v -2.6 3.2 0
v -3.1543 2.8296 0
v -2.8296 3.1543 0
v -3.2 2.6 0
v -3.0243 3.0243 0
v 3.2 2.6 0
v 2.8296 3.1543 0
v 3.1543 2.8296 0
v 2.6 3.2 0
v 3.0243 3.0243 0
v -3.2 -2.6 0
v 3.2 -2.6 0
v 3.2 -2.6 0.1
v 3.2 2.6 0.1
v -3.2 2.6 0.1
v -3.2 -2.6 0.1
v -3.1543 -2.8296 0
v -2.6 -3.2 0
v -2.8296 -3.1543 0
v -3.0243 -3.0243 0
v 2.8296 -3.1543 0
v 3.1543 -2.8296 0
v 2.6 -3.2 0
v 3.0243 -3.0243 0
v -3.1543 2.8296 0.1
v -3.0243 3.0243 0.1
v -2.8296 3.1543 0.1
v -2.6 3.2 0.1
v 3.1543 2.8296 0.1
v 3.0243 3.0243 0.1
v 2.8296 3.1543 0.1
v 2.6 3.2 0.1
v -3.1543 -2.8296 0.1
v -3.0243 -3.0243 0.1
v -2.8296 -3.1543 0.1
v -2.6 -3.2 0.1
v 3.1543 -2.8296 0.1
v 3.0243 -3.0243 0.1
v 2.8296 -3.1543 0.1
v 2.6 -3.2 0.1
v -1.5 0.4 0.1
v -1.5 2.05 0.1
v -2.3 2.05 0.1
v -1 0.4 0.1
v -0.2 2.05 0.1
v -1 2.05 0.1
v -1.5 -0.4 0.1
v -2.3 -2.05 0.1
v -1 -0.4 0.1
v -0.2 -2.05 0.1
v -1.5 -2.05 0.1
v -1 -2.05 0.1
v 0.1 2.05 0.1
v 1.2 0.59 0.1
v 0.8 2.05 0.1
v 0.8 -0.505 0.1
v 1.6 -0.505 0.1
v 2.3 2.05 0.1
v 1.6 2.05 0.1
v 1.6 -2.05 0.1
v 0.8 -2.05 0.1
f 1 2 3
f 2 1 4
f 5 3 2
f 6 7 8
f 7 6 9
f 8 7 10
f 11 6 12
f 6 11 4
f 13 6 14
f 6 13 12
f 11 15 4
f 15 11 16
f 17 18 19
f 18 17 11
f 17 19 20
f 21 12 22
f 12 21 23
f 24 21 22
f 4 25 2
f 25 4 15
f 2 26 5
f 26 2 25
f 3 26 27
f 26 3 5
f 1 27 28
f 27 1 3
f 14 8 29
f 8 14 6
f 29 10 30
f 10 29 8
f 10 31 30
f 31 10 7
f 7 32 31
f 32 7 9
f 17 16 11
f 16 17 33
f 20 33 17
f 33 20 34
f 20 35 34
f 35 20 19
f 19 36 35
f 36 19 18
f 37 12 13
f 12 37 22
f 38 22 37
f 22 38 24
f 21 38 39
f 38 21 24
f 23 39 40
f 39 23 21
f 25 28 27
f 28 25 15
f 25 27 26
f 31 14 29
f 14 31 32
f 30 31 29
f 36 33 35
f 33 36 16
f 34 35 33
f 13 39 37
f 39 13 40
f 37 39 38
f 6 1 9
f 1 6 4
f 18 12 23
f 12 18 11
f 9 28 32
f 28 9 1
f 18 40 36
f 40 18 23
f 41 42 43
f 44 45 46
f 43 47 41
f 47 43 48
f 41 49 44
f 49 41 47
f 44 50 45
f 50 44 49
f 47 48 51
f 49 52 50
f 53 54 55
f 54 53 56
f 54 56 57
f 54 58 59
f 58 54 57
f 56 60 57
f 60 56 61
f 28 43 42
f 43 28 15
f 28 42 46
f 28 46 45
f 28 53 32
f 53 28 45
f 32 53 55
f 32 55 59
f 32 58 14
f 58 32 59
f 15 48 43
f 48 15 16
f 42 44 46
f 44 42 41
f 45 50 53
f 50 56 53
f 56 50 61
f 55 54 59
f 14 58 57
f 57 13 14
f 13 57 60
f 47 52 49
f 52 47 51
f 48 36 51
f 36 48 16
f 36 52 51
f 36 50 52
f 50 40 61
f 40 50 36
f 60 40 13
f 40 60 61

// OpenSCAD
// file: ../p/4-4edge.scad
use <../lib.scad>
$fa=1; $fs=0.2;
function ldraw_lib__4_4edge(realsolid=false) = [
// 0 Circle 1.0
// 0 Name: 4-4edge.dat
// 0 Author: James Jessiman
// 0 !LDRAW_ORG Primitive UPDATE 2017-01
// 0 !LICENSE Licensed under CC BY 2.0 and CC BY 4.0 : see CAreadme.txt
// 
// 0 BFC CERTIFY CCW
  [0,"BFC","CERTIFY"],
  [0,"BFC","CCW"],
// 
// 0 !HISTORY 1998-12-15 [PTadmin] Official Update 1998-10
// 0 !HISTORY 2005-12-28 [PTadmin] Official Update 2005-01
// 0 !HISTORY 2007-06-24 [PTadmin] Header formatted for Contributor Agreement
// 0 !HISTORY 2008-07-01 [PTadmin] Official Update 2008-01
// 0 !HISTORY 2017-01-15 [Steffen] BFCed
// 0 !HISTORY 2017-12-30 [PTadmin] Official Update 2017-01
// 
// 
// 2 24 1 0 0 0.9239 0 0.3827
  [2,24,1,0,0,0.9239,0,0.3827],
// 2 24 0.9239 0 0.3827 0.7071 0 0.7071
  [2,24,0.9239,0,0.3827,0.7071,0,0.7071],
// 2 24 0.7071 0 0.7071 0.3827 0 0.9239
  [2,24,0.7071,0,0.7071,0.3827,0,0.9239],
// 2 24 0.3827 0 0.9239 0 0 1
  [2,24,0.3827,0,0.9239,0,0,1],
// 2 24 0 0 1 -0.3827 0 0.9239
  [2,24,0,0,1,-0.3827,0,0.9239],
// 2 24 -0.3827 0 0.9239 -0.7071 0 0.7071
  [2,24,-0.3827,0,0.9239,-0.7071,0,0.7071],
// 2 24 -0.7071 0 0.7071 -0.9239 0 0.3827
  [2,24,-0.7071,0,0.7071,-0.9239,0,0.3827],
// 2 24 -0.9239 0 0.3827 -1 0 -0
  [2,24,-0.9239,0,0.3827,-1,0,-0],
// 2 24 -1 0 -0 -0.9239 0 -0.3827
  [2,24,-1,0,-0,-0.9239,0,-0.3827],
// 2 24 -0.9239 0 -0.3827 -0.7071 0 -0.7071
  [2,24,-0.9239,0,-0.3827,-0.7071,0,-0.7071],
// 2 24 -0.7071 0 -0.7071 -0.3827 0 -0.9239
  [2,24,-0.7071,0,-0.7071,-0.3827,0,-0.9239],
// 2 24 -0.3827 0 -0.9239 0 0 -1
  [2,24,-0.3827,0,-0.9239,0,0,-1],
// 2 24 0 0 -1 0.3827 0 -0.9239
  [2,24,0,0,-1,0.3827,0,-0.9239],
// 2 24 0.3827 0 -0.9239 0.7071 0 -0.7071
  [2,24,0.3827,0,-0.9239,0.7071,0,-0.7071],
// 2 24 0.7071 0 -0.7071 0.9239 0 -0.3827
  [2,24,0.7071,0,-0.7071,0.9239,0,-0.3827],
// 2 24 0.9239 0 -0.3827 1 0 0
  [2,24,0.9239,0,-0.3827,1,0,0],
];
module ldraw_lib__4_4edge(step=0, col=false, unit=2/5, alt=false, line=0.2, solid=!$preview)
    makepoly(ldraw_lib__4_4edge(solid), step=step, col=col, unit=unit, alt=alt, line=line, solid=solid);
ldraw_lib__4_4edge(line=0.2);
// file: ../p/4-4disc.scad
use <../lib.scad>
$fa=1; $fs=0.2;
function ldraw_lib__4_4disc(realsolid=false) = [
// 0 Disc 1.0
// 0 Name: 4-4disc.dat
// 0 Author: James Jessiman
// 0 !LDRAW_ORG Primitive UPDATE 2002-02
// 0 !LICENSE Licensed under CC BY 2.0 and CC BY 4.0 : see CAreadme.txt
// 
// 0 BFC CERTIFY CCW
  [0,"BFC","CERTIFY"],
  [0,"BFC","CCW"],
// 
// 0 !HISTORY 1998-12-15 [PTadmin] Official Update 1998-10
// 0 !HISTORY 2002-03-23 [sbliss] Added BFC statement
// 0 !HISTORY 2002-04-25 [PTadmin] Official Update 2002-02
// 0 !HISTORY 2007-06-24 [PTadmin] Header formatted for Contributor Agreement
// 0 !HISTORY 2008-07-01 [PTadmin] Official Update 2008-01
// 
// 
// 3 16 0 0 0 1 0 0 0.9239 0 0.3827
  [3,16,0,0,0,1,0,0,0.9239,0,0.3827],
// 3 16 0 0 0 0.9239 0 0.3827 0.7071 0 0.7071
  [3,16,0,0,0,0.9239,0,0.3827,0.7071,0,0.7071],
// 3 16 0 0 0 0.7071 0 0.7071 0.3827 0 0.9239
  [3,16,0,0,0,0.7071,0,0.7071,0.3827,0,0.9239],
// 3 16 0 0 0 0.3827 0 0.9239 0 0 1
  [3,16,0,0,0,0.3827,0,0.9239,0,0,1],
// 3 16 0 0 0 0 0 1 -0.3827 0 0.9239
  [3,16,0,0,0,0,0,1,-0.3827,0,0.9239],
// 3 16 0 0 0 -0.3827 0 0.9239 -0.7071 0 0.7071
  [3,16,0,0,0,-0.3827,0,0.9239,-0.7071,0,0.7071],
// 3 16 0 0 0 -0.7071 0 0.7071 -0.9239 0 0.3827
  [3,16,0,0,0,-0.7071,0,0.7071,-0.9239,0,0.3827],
// 3 16 0 0 0 -0.9239 0 0.3827 -1 0 -0
  [3,16,0,0,0,-0.9239,0,0.3827,-1,0,-0],
// 3 16 0 0 0 -1 0 -0 -0.9239 0 -0.3827
  [3,16,0,0,0,-1,0,-0,-0.9239,0,-0.3827],
// 3 16 0 0 0 -0.9239 0 -0.3827 -0.7071 0 -0.7071
  [3,16,0,0,0,-0.9239,0,-0.3827,-0.7071,0,-0.7071],
// 3 16 0 0 0 -0.7071 0 -0.7071 -0.3827 0 -0.9239
  [3,16,0,0,0,-0.7071,0,-0.7071,-0.3827,0,-0.9239],
// 3 16 0 0 0 -0.3827 0 -0.9239 0 0 -1
  [3,16,0,0,0,-0.3827,0,-0.9239,0,0,-1],
// 3 16 0 0 0 0 0 -1 0.3827 0 -0.9239
  [3,16,0,0,0,0,0,-1,0.3827,0,-0.9239],
// 3 16 0 0 0 0.3827 0 -0.9239 0.7071 0 -0.7071
  [3,16,0,0,0,0.3827,0,-0.9239,0.7071,0,-0.7071],
// 3 16 0 0 0 0.7071 0 -0.7071 0.9239 0 -0.3827
  [3,16,0,0,0,0.7071,0,-0.7071,0.9239,0,-0.3827],
// 3 16 0 0 0 0.9239 0 -0.3827 1 0 0
  [3,16,0,0,0,0.9239,0,-0.3827,1,0,0],
// 0
];
module ldraw_lib__4_4disc(step=0, col=false, unit=2/5, alt=false, line=0.2, solid=!$preview)
    makepoly(ldraw_lib__4_4disc(solid), step=step, col=col, unit=unit, alt=alt, line=line, solid=solid);
ldraw_lib__4_4disc(line=0.2);
// file: ../p/4-4cyli.scad
use <../lib.scad>
$fa=1; $fs=0.2;
function ldraw_lib__4_4cyli(realsolid=false) = [
// 0 Cylinder 1.0
// 0 Name: 4-4cyli.dat
// 0 Author: James Jessiman
// 0 !LDRAW_ORG Primitive UPDATE 2005-01
// 0 !LICENSE Licensed under CC BY 2.0 and CC BY 4.0 : see CAreadme.txt
// 
// 0 BFC CERTIFY CCW
  [0,"BFC","CERTIFY"],
  [0,"BFC","CCW"],
// 
// 0 !HISTORY 1998-12-15 [PTadmin] Official Update 1998-10
// 0 !HISTORY 2002-03-23 [sbliss] Added BFC statement; merged headers from files in distributions LDraw 0.27 and Complete.
// 0 !HISTORY 2002-04-25 [PTadmin] Official Update 2002-02
// 0 !HISTORY 2004-12-14 [guyvivan] BFC CCW
// 0 !HISTORY 2005-12-28 [PTadmin] Official Update 2005-01
// 0 !HISTORY 2007-06-24 [PTadmin] Header formatted for Contributor Agreement
// 0 !HISTORY 2008-07-01 [PTadmin] Official Update 2008-01
// 
// 
// 4 16 1 1 0 0.9239 1 0.3827 0.9239 0 0.3827 1 0 0
  [4,16,1,1,0,0.9239,1,0.3827,0.9239,0,0.3827,1,0,0],
// 5 24 1 0 0 1 1 0 0.9239 0 0.3827 0.9239 0 -0.3827
  [5,24,1,0,0,1,1,0,0.9239,0,0.3827,0.9239,0,-0.3827],
// 4 16 0.9239 1 0.3827 0.7071 1 0.7071 0.7071 0 0.7071 0.9239 0 0.3827
  [4,16,0.9239,1,0.3827,0.7071,1,0.7071,0.7071,0,0.7071,0.9239,0,0.3827],
// 5 24 0.9239 0 0.3827 0.9239 1 0.3827 0.7071 0 0.7071 1 0 0
  [5,24,0.9239,0,0.3827,0.9239,1,0.3827,0.7071,0,0.7071,1,0,0],
// 4 16 0.7071 1 0.7071 0.3827 1 0.9239 0.3827 0 0.9239 0.7071 0 0.7071
  [4,16,0.7071,1,0.7071,0.3827,1,0.9239,0.3827,0,0.9239,0.7071,0,0.7071],
// 5 24 0.7071 0 0.7071 0.7071 1 0.7071 0.3827 0 0.9239 0.9239 0 0.3827
  [5,24,0.7071,0,0.7071,0.7071,1,0.7071,0.3827,0,0.9239,0.9239,0,0.3827],
// 4 16 0.3827 1 0.9239 0 1 1 0 0 1 0.3827 0 0.9239
  [4,16,0.3827,1,0.9239,0,1,1,0,0,1,0.3827,0,0.9239],
// 5 24 0.3827 0 0.9239 0.3827 1 0.9239 0 0 1 0.7071 0 0.7071
  [5,24,0.3827,0,0.9239,0.3827,1,0.9239,0,0,1,0.7071,0,0.7071],
// 4 16 0 1 1 -0.3827 1 0.9239 -0.3827 0 0.9239 0 0 1
  [4,16,0,1,1,-0.3827,1,0.9239,-0.3827,0,0.9239,0,0,1],
// 5 24 0 0 1 0 1 1 -0.3827 0 0.9239 0.3827 0 0.9239
  [5,24,0,0,1,0,1,1,-0.3827,0,0.9239,0.3827,0,0.9239],
// 4 16 -0.3827 1 0.9239 -0.7071 1 0.7071 -0.7071 0 0.7071 -0.3827 0 0.9239
  [4,16,-0.3827,1,0.9239,-0.7071,1,0.7071,-0.7071,0,0.7071,-0.3827,0,0.9239],
// 5 24 -0.3827 0 0.9239 -0.3827 1 0.9239 -0.7071 0 0.7071 0 0 1
  [5,24,-0.3827,0,0.9239,-0.3827,1,0.9239,-0.7071,0,0.7071,0,0,1],
// 4 16 -0.7071 1 0.7071 -0.9239 1 0.3827 -0.9239 0 0.3827 -0.7071 0 0.7071
  [4,16,-0.7071,1,0.7071,-0.9239,1,0.3827,-0.9239,0,0.3827,-0.7071,0,0.7071],
// 5 24 -0.7071 0 0.7071 -0.7071 1 0.7071 -0.9239 0 0.3827 -0.3827 0 0.9239
  [5,24,-0.7071,0,0.7071,-0.7071,1,0.7071,-0.9239,0,0.3827,-0.3827,0,0.9239],
// 4 16 -0.9239 1 0.3827 -1 1 0 -1 0 0 -0.9239 0 0.3827
  [4,16,-0.9239,1,0.3827,-1,1,0,-1,0,0,-0.9239,0,0.3827],
// 5 24 -0.9239 0 0.3827 -0.9239 1 0.3827 -1 0 0 -0.7071 0 0.7071
  [5,24,-0.9239,0,0.3827,-0.9239,1,0.3827,-1,0,0,-0.7071,0,0.7071],
// 4 16 -1 1 0 -0.9239 1 -0.3827 -0.9239 0 -0.3827 -1 0 0
  [4,16,-1,1,0,-0.9239,1,-0.3827,-0.9239,0,-0.3827,-1,0,0],
// 5 24 -1 0 0 -1 1 0 -0.9239 0 -0.3827 -0.9239 0 0.3827
  [5,24,-1,0,0,-1,1,0,-0.9239,0,-0.3827,-0.9239,0,0.3827],
// 4 16 -0.9239 1 -0.3827 -0.7071 1 -0.7071 -0.7071 0 -0.7071 -0.9239 0 -0.3827
  [4,16,-0.9239,1,-0.3827,-0.7071,1,-0.7071,-0.7071,0,-0.7071,-0.9239,0,-0.3827],
// 5 24 -0.9239 0 -0.3827 -0.9239 1 -0.3827 -0.7071 0 -0.7071 -1 0 0
  [5,24,-0.9239,0,-0.3827,-0.9239,1,-0.3827,-0.7071,0,-0.7071,-1,0,0],
// 4 16 -0.7071 1 -0.7071 -0.3827 1 -0.9239 -0.3827 0 -0.9239 -0.7071 0 -0.7071
  [4,16,-0.7071,1,-0.7071,-0.3827,1,-0.9239,-0.3827,0,-0.9239,-0.7071,0,-0.7071],
// 5 24 -0.7071 0 -0.7071 -0.7071 1 -0.7071 -0.3827 0 -0.9239 -0.9239 0 -0.3827
  [5,24,-0.7071,0,-0.7071,-0.7071,1,-0.7071,-0.3827,0,-0.9239,-0.9239,0,-0.3827],
// 4 16 -0.3827 1 -0.9239 0 1 -1 0 0 -1 -0.3827 0 -0.9239
  [4,16,-0.3827,1,-0.9239,0,1,-1,0,0,-1,-0.3827,0,-0.9239],
// 5 24 -0.3827 0 -0.9239 -0.3827 1 -0.9239 0 0 -1 -0.7071 0 -0.7071
  [5,24,-0.3827,0,-0.9239,-0.3827,1,-0.9239,0,0,-1,-0.7071,0,-0.7071],
// 4 16 0 1 -1 0.3827 1 -0.9239 0.3827 0 -0.9239 0 0 -1
  [4,16,0,1,-1,0.3827,1,-0.9239,0.3827,0,-0.9239,0,0,-1],
// 5 24 0 0 -1 0 1 -1 0.3827 0 -0.9239 -0.3827 0 -0.9239
  [5,24,0,0,-1,0,1,-1,0.3827,0,-0.9239,-0.3827,0,-0.9239],
// 4 16 0.3827 1 -0.9239 0.7071 1 -0.7071 0.7071 0 -0.7071 0.3827 0 -0.9239
  [4,16,0.3827,1,-0.9239,0.7071,1,-0.7071,0.7071,0,-0.7071,0.3827,0,-0.9239],
// 5 24 0.3827 0 -0.9239 0.3827 1 -0.9239 0.7071 0 -0.7071 0 0 -1
  [5,24,0.3827,0,-0.9239,0.3827,1,-0.9239,0.7071,0,-0.7071,0,0,-1],
// 4 16 0.7071 1 -0.7071 0.9239 1 -0.3827 0.9239 0 -0.3827 0.7071 0 -0.7071
  [4,16,0.7071,1,-0.7071,0.9239,1,-0.3827,0.9239,0,-0.3827,0.7071,0,-0.7071],
// 5 24 0.7071 0 -0.7071 0.7071 1 -0.7071 0.9239 0 -0.3827 0.3827 0 -0.9239
  [5,24,0.7071,0,-0.7071,0.7071,1,-0.7071,0.9239,0,-0.3827,0.3827,0,-0.9239],
// 4 16 0.9239 1 -0.3827 1 1 0 1 0 0 0.9239 0 -0.3827
  [4,16,0.9239,1,-0.3827,1,1,0,1,0,0,0.9239,0,-0.3827],
// 5 24 0.9239 0 -0.3827 0.9239 1 -0.3827 1 0 0 0.7071 0 -0.7071
  [5,24,0.9239,0,-0.3827,0.9239,1,-0.3827,1,0,0,0.7071,0,-0.7071],
// 0
];
module ldraw_lib__4_4cyli(step=0, col=false, unit=2/5, alt=false, line=0.2, solid=!$preview)
    makepoly(ldraw_lib__4_4cyli(solid), step=step, col=col, unit=unit, alt=alt, line=line, solid=solid);
ldraw_lib__4_4cyli(line=0.2);
// file: ../p/stud3.scad
use <../lib.scad>
use <4-4cyli.scad>
use <4-4disc.scad>
use <4-4edge.scad>
$fa=1; $fs=0.2;
function ldraw_lib__stud3(realsolid=false) = realsolid ? 
    [openscad(translate([0,0,-eps()], o=cylinder(4+eps(), r=4)),2)] : [
// 0 Stud Tube Solid
// 0 Name: stud3.dat
// 0 Author: James Jessiman
// 0 !LDRAW_ORG Primitive UPDATE 2012-01
// 0 !LICENSE Licensed under CC BY 2.0 and CC BY 4.0 : see CAreadme.txt
// 
// 0 BFC CERTIFY CCW
  [0,"BFC","CERTIFY"],
  [0,"BFC","CCW"],
// 
// 0 !HISTORY 2002-04-04 [sbliss] Modified for BFC compliance
// 0 !HISTORY 2002-04-25 [PTadmin] Official Update 2002-02
// 0 !HISTORY 2007-06-24 [PTadmin] Header formatted for Contributor Agreement
// 0 !HISTORY 2008-07-01 [PTadmin] Official Update 2008-01
// 0 !HISTORY 2012-02-16 [Philo] Changed to CCW
// 0 !HISTORY 2012-03-30 [PTadmin] Official Update 2012-01
// 
// 
// 1 16 0 -4 0 4 0 0 0 1 0 0 0 4 4-4edge.dat
  [1,16,0,-4,0,4,0,0,0,1,0,0,0,4, ldraw_lib__4_4edge(realsolid)],
// 1 16 0 0 0 4 0 0 0 1 0 0 0 4 4-4edge.dat
  [1,16,0,0,0,4,0,0,0,1,0,0,0,4, ldraw_lib__4_4edge(realsolid)],
// 1 16 0 -4 0 4 0 0 0 1 0 0 0 4 4-4disc.dat
  [1,16,0,-4,0,4,0,0,0,1,0,0,0,4, ldraw_lib__4_4disc(realsolid)],
// 1 16 0 -4 0 4 0 0 0 4 0 0 0 4 4-4cyli.dat
  [1,16,0,-4,0,4,0,0,0,4,0,0,0,4, ldraw_lib__4_4cyli(realsolid)],
];
module ldraw_lib__stud3(step=0, col=false, unit=2/5, alt=false, line=0.2, solid=!$preview)
    makepoly(ldraw_lib__stud3(solid), step=step, col=col, unit=unit, alt=alt, line=line, solid=solid);
ldraw_lib__stud3(line=0.2);
// file: ../p/stud.scad
use <../lib.scad>
use <4-4cyli.scad>
use <4-4disc.scad>
use <4-4edge.scad>
$fa=1; $fs=0.2;
function ldraw_lib__stud(realsolid=false) = realsolid ? 
    [openscad(translate([0,0,-eps()], o=cylinder(4+eps(), r=6)),2)] : [
// 0 Stud
// 0 Name: stud.dat
// 0 Author: James Jessiman
// 0 !LDRAW_ORG Primitive UPDATE 2012-01
// 0 !LICENSE Licensed under CC BY 2.0 and CC BY 4.0 : see CAreadme.txt
// 
// 0 BFC CERTIFY CCW
  [0,"BFC","CERTIFY"],
  [0,"BFC","CCW"],
// 
// 0 !HISTORY 2002-04-04 [sbliss] Modified for BFC compliance
// 0 !HISTORY 2002-04-25 [PTadmin] Official Update 2002-02
// 0 !HISTORY 2007-06-24 [PTadmin] Header formatted for Contributor Agreement
// 0 !HISTORY 2008-07-01 [PTadmin] Official Update 2008-01
// 0 !HISTORY 2012-02-16 [Philo] Changed to CCW
// 0 !HISTORY 2012-03-30 [PTadmin] Official Update 2012-01
// 
// 
// 1 16 0 0 0 6 0 0 0 1 0 0 0 6 4-4edge.dat
  [1,16,0,0,0,6,0,0,0,1,0,0,0,6, ldraw_lib__4_4edge(realsolid)],
// 1 16 0 -4 0 6 0 0 0 1 0 0 0 6 4-4edge.dat
  [1,16,0,-4,0,6,0,0,0,1,0,0,0,6, ldraw_lib__4_4edge(realsolid)],
// 1 16 0 0 0 6 0 0 0 -4 0 0 0 6 4-4cyli.dat
  [1,16,0,0,0,6,0,0,0,-4,0,0,0,6, ldraw_lib__4_4cyli(realsolid)],
// 1 16 0 -4 0 6 0 0 0 1 0 0 0 6 4-4disc.dat
  [1,16,0,-4,0,6,0,0,0,1,0,0,0,6, ldraw_lib__4_4disc(realsolid)],
];
module ldraw_lib__stud(step=0, col=false, unit=2/5, alt=false, line=0.2, solid=!$preview)
    makepoly(ldraw_lib__stud(solid), step=step, col=col, unit=unit, alt=alt, line=line, solid=solid);
ldraw_lib__stud(line=0.2);
// file: ../p/box5.scad
use <../lib.scad>
$fa=1; $fs=0.2;
function ldraw_lib__box5(realsolid=false) = [
// 0 Box with 5 Faces and All Edges
// 0 Name: box5.dat
// 0 Author: James Jessiman
// 0 !LDRAW_ORG Primitive UPDATE 2012-01
// 0 !LICENSE Licensed under CC BY 2.0 and CC BY 4.0 : see CAreadme.txt
// 
// 0 BFC CERTIFY CCW
  [0,"BFC","CERTIFY"],
  [0,"BFC","CCW"],
// 
// 0 !HISTORY 2002-04-03 [sbliss] Modified for BFC compliance
// 0 !HISTORY 2002-04-25 [PTadmin] Official Update 2002-02
// 0 !HISTORY 2007-06-24 [PTadmin] Header formatted for Contributor Agreement
// 0 !HISTORY 2008-07-01 [PTadmin] Official Update 2008-01
// 0 !HISTORY 2012-02-16 [Philo] Changed to CCW
// 0 !HISTORY 2012-03-30 [PTadmin] Official Update 2012-01
// 
// 
// 2 24 1 1 1 -1 1 1
  [2,24,1,1,1,-1,1,1],
// 2 24 -1 1 1 -1 1 -1
  [2,24,-1,1,1,-1,1,-1],
// 2 24 -1 1 -1 1 1 -1
  [2,24,-1,1,-1,1,1,-1],
// 2 24 1 1 -1 1 1 1
  [2,24,1,1,-1,1,1,1],
// 2 24 1 0 1 -1 0 1
  [2,24,1,0,1,-1,0,1],
// 2 24 -1 0 1 -1 0 -1
  [2,24,-1,0,1,-1,0,-1],
// 2 24 -1 0 -1 1 0 -1
  [2,24,-1,0,-1,1,0,-1],
// 2 24 1 0 -1 1 0 1
  [2,24,1,0,-1,1,0,1],
// 2 24 1 0 1 1 1 1
  [2,24,1,0,1,1,1,1],
// 2 24 -1 0 1 -1 1 1
  [2,24,-1,0,1,-1,1,1],
// 2 24 1 0 -1 1 1 -1
  [2,24,1,0,-1,1,1,-1],
// 2 24 -1 0 -1 -1 1 -1
  [2,24,-1,0,-1,-1,1,-1],
// 4 16 -1 1 1 1 1 1 1 1 -1 -1 1 -1
  [4,16,-1,1,1,1,1,1,1,1,-1,-1,1,-1],
// 4 16 -1 1 1 -1 0 1 1 0 1 1 1 1
  [4,16,-1,1,1,-1,0,1,1,0,1,1,1,1],
// 4 16 -1 1 -1 -1 0 -1 -1 0 1 -1 1 1
  [4,16,-1,1,-1,-1,0,-1,-1,0,1,-1,1,1],
// 4 16 1 1 -1 1 0 -1 -1 0 -1 -1 1 -1
  [4,16,1,1,-1,1,0,-1,-1,0,-1,-1,1,-1],
// 4 16 1 1 1 1 0 1 1 0 -1 1 1 -1
  [4,16,1,1,1,1,0,1,1,0,-1,1,1,-1],
];
module ldraw_lib__box5(step=0, col=false, unit=2/5, alt=false, line=0.2, solid=!$preview)
    makepoly(ldraw_lib__box5(solid), step=step, col=col, unit=unit, alt=alt, line=line, solid=solid);
ldraw_lib__box5(line=0.2);
// file: ../p/box4t.scad
use <../lib.scad>
$fa=1; $fs=0.2;
function ldraw_lib__box4t(realsolid=false) = [
// 0 Box with 4 Adjacent Faces and All Edges
// 0 Name: box4t.dat
// 0 Author: Tore Eriksson [Tore_Eriksson]
// 0 !LDRAW_ORG Primitive UPDATE 2003-02
// 0 !LICENSE Licensed under CC BY 2.0 and CC BY 4.0 : see CAreadme.txt
// 
// 0 BFC CERTIFY CCW
  [0,"BFC","CERTIFY"],
  [0,"BFC","CCW"],
// 
// 0 !HISTORY 1997-09-29 [PTadmin] Official Update 1997-15
// 0 !HISTORY 2002-08-31 [izanette] Modified with WINDZ for BFC compliance
// 0 !HISTORY 2003-08-01 [PTadmin] Official Update 2003-02
// 0 !HISTORY 2007-06-24 [PTadmin] Header formatted for Contributor Agreement
// 0 !HISTORY 2008-07-01 [PTadmin] Official Update 2008-01
// 
// 
// 2 24 1 1 1 -1 1 1
  [2,24,1,1,1,-1,1,1],
// 2 24 -1 1 1 -1 1 -1
  [2,24,-1,1,1,-1,1,-1],
// 2 24 -1 1 -1 1 1 -1
  [2,24,-1,1,-1,1,1,-1],
// 2 24 1 1 -1 1 1 1
  [2,24,1,1,-1,1,1,1],
// 2 24 1 0 1 -1 0 1
  [2,24,1,0,1,-1,0,1],
// 2 24 -1 0 1 -1 0 -1
  [2,24,-1,0,1,-1,0,-1],
// 2 24 -1 0 -1 1 0 -1
  [2,24,-1,0,-1,1,0,-1],
// 2 24 1 0 -1 1 0 1
  [2,24,1,0,-1,1,0,1],
// 2 24 1 0 1 1 1 1
  [2,24,1,0,1,1,1,1],
// 2 24 -1 0 1 -1 1 1
  [2,24,-1,0,1,-1,1,1],
// 2 24 1 0 -1 1 1 -1
  [2,24,1,0,-1,1,1,-1],
// 2 24 -1 0 -1 -1 1 -1
  [2,24,-1,0,-1,-1,1,-1],
// 4 16 1 1 1 1 1 -1 -1 1 -1 -1 1 1
  [4,16,1,1,1,1,1,-1,-1,1,-1,-1,1,1],
// 4 16 1 1 1 -1 1 1 -1 0 1 1 0 1
  [4,16,1,1,1,-1,1,1,-1,0,1,1,0,1],
// 4 16 -1 1 1 -1 1 -1 -1 0 -1 -1 0 1
  [4,16,-1,1,1,-1,1,-1,-1,0,-1,-1,0,1],
// 0 4 16 -1 1 -1 -1 0 -1 1 0 -1 1 1 -1
// 4 16 1 1 -1 1 1 1 1 0 1 1 0 -1
  [4,16,1,1,-1,1,1,1,1,0,1,1,0,-1],
// 0
];
module ldraw_lib__box4t(step=0, col=false, unit=2/5, alt=false, line=0.2, solid=!$preview)
    makepoly(ldraw_lib__box4t(solid), step=step, col=col, unit=unit, alt=alt, line=line, solid=solid);
ldraw_lib__box4t(line=0.2);
// file: s/3004s01.scad
use <../../lib.scad>
use <../../p/box4t.scad>
use <../../p/box5.scad>
use <../../p/stud.scad>
use <../../p/stud3.scad>
$fa=1; $fs=0.2;
function ldraw_lib__s__3004s01(realsolid=false) = [
// 0 ~Brick  1 x  2 without Front Face
// 0 Name: s\3004s01.dat
// 0 Author: James Jessiman
// 0 !LDRAW_ORG Subpart UPDATE 2003-03
// 0 !LICENSE Licensed under CC BY 2.0 and CC BY 4.0 : see CAreadme.txt
// 
// 0 BFC CERTIFY CCW
  [0,"BFC","CERTIFY"],
  [0,"BFC","CCW"],
// 
// 0 !HISTORY 2003-09-07 [jriley] Subfiling, BFC
// 0 !HISTORY 2003-12-19 [PTadmin] Official Update 2003-03
// 0 !HISTORY 2007-08-29 [PTadmin] Header formatted for Contributor Agreement
// 0 !HISTORY 2008-07-01 [PTadmin] Official Update 2008-01
// 
// 
// 1 16 0 4 0 1 0 0 0 -5 0 0 0 1 stud3.dat
  [1,16,0,4,0,1,0,0,0,-5,0,0,0,1, ldraw_lib__stud3(realsolid)],
// 0 BFC INVERTNEXT
  [0,"BFC","INVERTNEXT"],
// 1 16 0 24 0 16 0 0 0 -20 0 0 0 6 box5.dat
  [1,16,0,24,0,16,0,0,0,-20,0,0,0,6, ldraw_lib__box5(realsolid)],
// 4 16 20 24 10 16 24 6 -16 24 6 -20 24 10
  [4,16,20,24,10,16,24,6,-16,24,6,-20,24,10],
// 4 16 -20 24 10 -16 24 6 -16 24 -6 -20 24 -10
  [4,16,-20,24,10,-16,24,6,-16,24,-6,-20,24,-10],
// 4 16 -20 24 -10 -16 24 -6 16 24 -6 20 24 -10
  [4,16,-20,24,-10,-16,24,-6,16,24,-6,20,24,-10],
// 4 16 20 24 -10 16 24 -6 16 24 6 20 24 10
  [4,16,20,24,-10,16,24,-6,16,24,6,20,24,10],
// 1 16 0 24 0 20 0 0 0 -24 0 0 0 10 box4t.dat
  [1,16,0,24,0,20,0,0,0,-24,0,0,0,10, ldraw_lib__box4t(realsolid)],
// 1 16 10 0 0 1 0 0 0 1 0 0 0 1 stud.dat
  [1,16,10,0,0,1,0,0,0,1,0,0,0,1, ldraw_lib__stud(realsolid)],
// 1 16 -10 0 0 1 0 0 0 1 0 0 0 1 stud.dat
  [1,16,-10,0,0,1,0,0,0,1,0,0,0,1, ldraw_lib__stud(realsolid)],
// 0
];
module ldraw_lib__s__3004s01(step=0, col=false, unit=2/5, alt=false, line=0.2, solid=!$preview)
    makepoly(ldraw_lib__s__3004s01(solid), step=step, col=col, unit=unit, alt=alt, line=line, solid=solid);
ldraw_lib__s__3004s01(line=0.2);
// file: 3004.scad
use <../lib.scad>
use <s/3004s01.scad>
$fa=1; $fs=0.2;
function ldraw_lib__3004(realsolid=false) = [
// 0 Brick  1 x  2
// 0 Name: 3004.dat
// 0 Author: James Jessiman
// 0 !LDRAW_ORG Part UPDATE 2022-05
// 0 !LICENSE Licensed under CC BY 2.0 and CC BY 4.0 : see CAreadme.txt
// 
// 0 BFC CERTIFY CCW
  [0,"BFC","CERTIFY"],
  [0,"BFC","CCW"],
// 
// 0 !HISTORY 2001-10-26 [PTadmin] Official Update 2001-01
// 0 !HISTORY 2002-05-07 {unknown} BFC Certification
// 0 !HISTORY 2002-06-11 [PTadmin] Official Update 2002-03
// 0 !HISTORY 2007-05-07 [PTadmin] Header formatted for Contributor Agreement
// 0 !HISTORY 2008-07-01 [PTadmin] Official Update 2008-01
// 0 !HISTORY 2022-08-04 [MagFors] Using subfile
// 0 !HISTORY 2022-09-15 [PTadmin] Official Update 2022-05
// 
// 
// 1 16 0 0 0 1 0 0 0 1 0 0 0 1 s\3004s01.dat
  [1,16,0,0,0,1,0,0,0,1,0,0,0,1, ldraw_lib__s__3004s01(realsolid)],
// 4 16 -20 24 -10 20 24 -10 20 0 -10 -20 0 -10
  [4,16,-20,24,-10,20,24,-10,20,0,-10,-20,0,-10],
];
module ldraw_lib__3004(step=0, col=false, unit=2/5, alt=false, line=0.2, solid=!$preview)
    makepoly(ldraw_lib__3004(solid), step=step, col=col, unit=unit, alt=alt, line=line, solid=solid);
ldraw_lib__3004(line=0.2);
// file: ../p/box3u12.scad
use <../lib.scad>
$fa=1; $fs=0.2;
function ldraw_lib__box3u12(realsolid=false) = [
// 0 Box with 3 Parallel Faces without Any Edges
// 0 Name: box3u12.dat
// 0 Author: J.C. Tchang [tchang]
// 0 !LDRAW_ORG Primitive UPDATE 2014-02
// 0 !LICENSE Licensed under CC BY 2.0 and CC BY 4.0 : see CAreadme.txt
// 
// 0 BFC CERTIFY CCW
  [0,"BFC","CERTIFY"],
  [0,"BFC","CCW"],
// 
// 0 !HISTORY 2014-12-23 [PTadmin] Official Update 2014-02
// 
// 
// 4 16 -1 1 1 1 1 1 1 1 -1 -1 1 -1
  [4,16,-1,1,1,1,1,1,1,1,-1,-1,1,-1],
// 4 16 -1 1 1 -1 0 1 1 0 1 1 1 1
  [4,16,-1,1,1,-1,0,1,1,0,1,1,1,1],
// 4 16 1 1 -1 1 0 -1 -1 0 -1 -1 1 -1
  [4,16,1,1,-1,1,0,-1,-1,0,-1,-1,1,-1],
];
module ldraw_lib__box3u12(step=0, col=false, unit=2/5, alt=false, line=0.2, solid=!$preview)
    makepoly(ldraw_lib__box3u12(solid), step=step, col=col, unit=unit, alt=alt, line=line, solid=solid);
ldraw_lib__box3u12(line=0.2);
// file: ../p/1-4cyli.scad
use <../lib.scad>
$fa=1; $fs=0.2;
function ldraw_lib__1_4cyli(realsolid=false) = [
// 0 Cylinder 0.25
// 0 Name: 1-4cyli.dat
// 0 Author: James Jessiman
// 0 !LDRAW_ORG Primitive UPDATE 2012-01
// 0 !LICENSE Licensed under CC BY 2.0 and CC BY 4.0 : see CAreadme.txt
// 
// 0 BFC CERTIFY CCW
  [0,"BFC","CERTIFY"],
  [0,"BFC","CCW"],
// 
// 0 !HISTORY 2002-03-23 [sbliss] Added BFC statement.
// 0 !HISTORY 2002-04-25 [PTadmin] Official Update 2002-02
// 0 !HISTORY 2007-06-22 [PTadmin] Header formatted for Contributor Agreement
// 0 !HISTORY 2008-07-01 [PTadmin] Official Update 2008-01
// 0 !HISTORY 2012-02-16 [Philo] Changed to CCW
// 0 !HISTORY 2012-03-30 [PTadmin] Official Update 2012-01
// 
// 
// 4 16 1 1 0 0.9239 1 0.3827 0.9239 0 0.3827 1 0 0
  [4,16,1,1,0,0.9239,1,0.3827,0.9239,0,0.3827,1,0,0],
// 5 24 1 0 0 1 1 0 0.9239 0 0.3827 1 0 -1
  [5,24,1,0,0,1,1,0,0.9239,0,0.3827,1,0,-1],
// 4 16 0.9239 1 0.3827 0.7071 1 0.7071 0.7071 0 0.7071 0.9239 0 0.3827
  [4,16,0.9239,1,0.3827,0.7071,1,0.7071,0.7071,0,0.7071,0.9239,0,0.3827],
// 5 24 0.9239 0 0.3827 0.9239 1 0.3827 0.7071 0 0.7071 1 0 0
  [5,24,0.9239,0,0.3827,0.9239,1,0.3827,0.7071,0,0.7071,1,0,0],
// 4 16 0.7071 1 0.7071 0.3827 1 0.9239 0.3827 0 0.9239 0.7071 0 0.7071
  [4,16,0.7071,1,0.7071,0.3827,1,0.9239,0.3827,0,0.9239,0.7071,0,0.7071],
// 5 24 0.7071 0 0.7071 0.7071 1 0.7071 0.3827 0 0.9239 0.9239 0 0.3827
  [5,24,0.7071,0,0.7071,0.7071,1,0.7071,0.3827,0,0.9239,0.9239,0,0.3827],
// 4 16 0.3827 1 0.9239 0 1 1 0 0 1 0.3827 0 0.9239
  [4,16,0.3827,1,0.9239,0,1,1,0,0,1,0.3827,0,0.9239],
// 5 24 0.3827 0 0.9239 0.3827 1 0.9239 0 0 1 0.7071 0 0.7071
  [5,24,0.3827,0,0.9239,0.3827,1,0.9239,0,0,1,0.7071,0,0.7071],
// 5 24 0 0 1 0 1 1 0.3827 0 0.9239 -1 0 1
  [5,24,0,0,1,0,1,1,0.3827,0,0.9239,-1,0,1],
];
module ldraw_lib__1_4cyli(step=0, col=false, unit=2/5, alt=false, line=0.2, solid=!$preview)
    makepoly(ldraw_lib__1_4cyli(solid), step=step, col=col, unit=unit, alt=alt, line=line, solid=solid);
ldraw_lib__1_4cyli(line=0.2);
// file: ../p/1-4chrd.scad
use <../lib.scad>
$fa=1; $fs=0.2;
function ldraw_lib__1_4chrd(realsolid=false) = [
// 0 Chord 0.25
// 0 Name: 1-4chrd.dat
// 0 Author: Tony Hafner [hafhead]
// 0 !LDRAW_ORG Primitive UPDATE 2012-02
// 0 !LICENSE Licensed under CC BY 2.0 and CC BY 4.0 : see CAreadme.txt
// 
// 0 BFC CERTIFY CCW
  [0,"BFC","CERTIFY"],
  [0,"BFC","CCW"],
// 
// 0 !HISTORY 2004-04-22 [PTadmin] Official Update 2004-02
// 0 !HISTORY 2007-10-09 [PTadmin] Header formatted for Contributor Agreement
// 0 !HISTORY 2008-07-01 [PTadmin] Official Update 2008-01
// 0 !HISTORY 2012-08-02 [MMR1988] Re-creation with PrimGen2 and Rectifier
// 0 !HISTORY 2012-08-09 [PTadmin] Official Update 2012-02
// 
// 
// 4 16 0.9239 0 0.3827 0.3827 0 0.9239 0 0 1 1 0 0
  [4,16,0.9239,0,0.3827,0.3827,0,0.9239,0,0,1,1,0,0],
// 3 16 0.7071 0 0.7071 0.3827 0 0.9239 0.9239 0 0.3827
  [3,16,0.7071,0,0.7071,0.3827,0,0.9239,0.9239,0,0.3827],
];
module ldraw_lib__1_4chrd(step=0, col=false, unit=2/5, alt=false, line=0.2, solid=!$preview)
    makepoly(ldraw_lib__1_4chrd(solid), step=step, col=col, unit=unit, alt=alt, line=line, solid=solid);
ldraw_lib__1_4chrd(line=0.2);
// main file
use <../lib.scad>
use <../p/1-4chrd.scad>
use <../p/1-4cyli.scad>
use <../p/box3u12.scad>
$fa=1; $fs=0.2;
function ldraw_lib__6142275t(realsolid=false) = [
// 0 Sticker  0.8 x  0.8 with Red "HY" in White Square on Red Background
// 0 Name: 6142275t.dat
// 0 Author: Massimo Maso [Sirio]
// 0 !LDRAW_ORG Part UPDATE 2022-06
// 0 !LICENSE Licensed under CC BY 2.0 and CC BY 4.0 : see CAreadme.txt
// 
// 0 BFC CERTIFY CCW
  [0,"BFC","CERTIFY"],
  [0,"BFC","CCW"],
// 
// 0 !KEYWORDS Audi, e-tron, quattro, R18, Set 75872, Speed Champions
// 
// 0 !HISTORY 2022-12-20 [PTadmin] Official Update 2022-06
// 
// 
// 0 // Primitives
// 1 16 -6.5 0 6.5 -1.5 0 0 0 -1 0 0 0 1.5 1-4chrd.dat
  [1,16,-6.5,0,6.5,-1.5,0,0,0,-1,0,0,0,1.5, ldraw_lib__1_4chrd(realsolid)],
// 1 16 6.5 0 6.5 1.5 0 0 0 -1 0 0 0 1.5 1-4chrd.dat
  [1,16,6.5,0,6.5,1.5,0,0,0,-1,0,0,0,1.5, ldraw_lib__1_4chrd(realsolid)],
// 1 16 0 -.25 0 0 0 8 0 .25 0 -6.5 0 0 box3u12.dat
  [1,16,0,-.25,0,0,0,8,0,.25,0,-6.5,0,0, ldraw_lib__box3u12(realsolid)],
// 1 16 -6.5 0 -6.5 -1.5 0 0 0 -1 0 0 0 -1.5 1-4chrd.dat
  [1,16,-6.5,0,-6.5,-1.5,0,0,0,-1,0,0,0,-1.5, ldraw_lib__1_4chrd(realsolid)],
// 1 16 6.5 0 -6.5 1.5 0 0 0 -1 0 0 0 -1.5 1-4chrd.dat
  [1,16,6.5,0,-6.5,1.5,0,0,0,-1,0,0,0,-1.5, ldraw_lib__1_4chrd(realsolid)],
// 1 16 -6.5 0 6.5 -1.5 0 0 0 -.25 0 0 0 1.5 1-4cyli.dat
  [1,16,-6.5,0,6.5,-1.5,0,0,0,-.25,0,0,0,1.5, ldraw_lib__1_4cyli(realsolid)],
// 1 16 6.5 0 6.5 1.5 0 0 0 -.25 0 0 0 1.5 1-4cyli.dat
  [1,16,6.5,0,6.5,1.5,0,0,0,-.25,0,0,0,1.5, ldraw_lib__1_4cyli(realsolid)],
// 1 16 -6.5 0 -6.5 -1.5 0 0 0 -.25 0 0 0 -1.5 1-4cyli.dat
  [1,16,-6.5,0,-6.5,-1.5,0,0,0,-.25,0,0,0,-1.5, ldraw_lib__1_4cyli(realsolid)],
// 1 16 6.5 0 -6.5 1.5 0 0 0 -.25 0 0 0 -1.5 1-4cyli.dat
  [1,16,6.5,0,-6.5,1.5,0,0,0,-.25,0,0,0,-1.5, ldraw_lib__1_4cyli(realsolid)],
// 1 4 -6.5 -.25 6.5 -1.5 0 0 0 1 0 0 0 1.5 1-4chrd.dat
  [1,4,-6.5,-.25,6.5,-1.5,0,0,0,1,0,0,0,1.5, ldraw_lib__1_4chrd(realsolid)],
// 1 4 6.5 -.25 6.5 1.5 0 0 0 1 0 0 0 1.5 1-4chrd.dat
  [1,4,6.5,-.25,6.5,1.5,0,0,0,1,0,0,0,1.5, ldraw_lib__1_4chrd(realsolid)],
// 1 4 -6.5 -.25 -6.5 -1.5 0 0 0 1 0 0 0 -1.5 1-4chrd.dat
  [1,4,-6.5,-.25,-6.5,-1.5,0,0,0,1,0,0,0,-1.5, ldraw_lib__1_4chrd(realsolid)],
// 1 4 6.5 -.25 -6.5 1.5 0 0 0 1 0 0 0 -1.5 1-4chrd.dat
  [1,4,6.5,-.25,-6.5,1.5,0,0,0,1,0,0,0,-1.5, ldraw_lib__1_4chrd(realsolid)],
// 0 // Bottom faces
// 4 16 6.5 0 8 8 0 6.5 -8 0 6.5 -6.5 0 8
  [4,16,6.5,0,8,8,0,6.5,-8,0,6.5,-6.5,0,8],
// 4 16 6.5 0 -8 -6.5 0 -8 -8 0 -6.5 8 0 -6.5
  [4,16,6.5,0,-8,-6.5,0,-8,-8,0,-6.5,8,0,-6.5],
// 0 // Lateral faces
// 4 16 -6.5 0 8 -6.5 -.25 8 6.5 -.25 8 6.5 0 8
  [4,16,-6.5,0,8,-6.5,-.25,8,6.5,-.25,8,6.5,0,8],
// 4 16 -6.5 0 -8 6.5 0 -8 6.5 -.25 -8 -6.5 -.25 -8
  [4,16,-6.5,0,-8,6.5,0,-8,6.5,-.25,-8,-6.5,-.25,-8],
// 0 // Top faces
// 0 // White Text "HY"
// 0 // Letter "H"
// 3 15 -3.75 -.25 1 -3.75 -.25 5.125 -5.75 -.25 5.125
  [3,15,-3.75,-.25,1,-3.75,-.25,5.125,-5.75,-.25,5.125],
// 3 15 -2.5 -.25 1 -.5 -.25 5.125 -2.5 -.25 5.125
  [3,15,-2.5,-.25,1,-.5,-.25,5.125,-2.5,-.25,5.125],
// 4 15 -3.75 -.25 1 -5.75 -.25 5.125 -5.75 -.25 -5.125 -3.75 -.25 -1
  [4,15,-3.75,-.25,1,-5.75,-.25,5.125,-5.75,-.25,-5.125,-3.75,-.25,-1],
// 4 15 -3.75 -.25 1 -3.75 -.25 -1 -2.5 -.25 -1 -2.5 -.25 1
  [4,15,-3.75,-.25,1,-3.75,-.25,-1,-2.5,-.25,-1,-2.5,-.25,1],
// 4 15 -2.5 -.25 1 -2.5 -.25 -1 -.5 -.25 -5.125 -.5 -.25 5.125
  [4,15,-2.5,-.25,1,-2.5,-.25,-1,-.5,-.25,-5.125,-.5,-.25,5.125],
// 3 15 -3.75 -.25 -1 -5.75 -.25 -5.125 -3.75 -.25 -5.125
  [3,15,-3.75,-.25,-1,-5.75,-.25,-5.125,-3.75,-.25,-5.125],
// 3 15 -2.5 -.25 -1 -2.5 -.25 -5.125 -.5 -.25 -5.125
  [3,15,-2.5,-.25,-1,-2.5,-.25,-5.125,-.5,-.25,-5.125],
// 0 // Letter "Y"
// 4 15 3 -.25 1.475 2 -.25 5.125 .25 -.25 5.125 2 -.25 -1.2625
  [4,15,3,-.25,1.475,2,-.25,5.125,.25,-.25,5.125,2,-.25,-1.2625],
// 3 15 3 -.25 1.475 2 -.25 -1.2625 4 -.25 -1.2625
  [3,15,3,-.25,1.475,2,-.25,-1.2625,4,-.25,-1.2625],
// 4 15 3 -.25 1.475 4 -.25 -1.2625 5.75 -.25 5.125 4 -.25 5.125
  [4,15,3,-.25,1.475,4,-.25,-1.2625,5.75,-.25,5.125,4,-.25,5.125],
// 4 15 2 -.25 -1.2625 2 -.25 -5.125 4 -.25 -5.125 4 -.25 -1.2625
  [4,15,2,-.25,-1.2625,2,-.25,-5.125,4,-.25,-5.125,4,-.25,-1.2625],
// 0 // Red background
// 4 4 -6.5 -.25 8 -8 -.25 6.5 -5.75 -.25 5.125 -3.75 -.25 5.125
  [4,4,-6.5,-.25,8,-8,-.25,6.5,-5.75,-.25,5.125,-3.75,-.25,5.125],
// 3 4 -6.5 -.25 8 -3.75 -.25 5.125 -2.5 -.25 5.125
  [3,4,-6.5,-.25,8,-3.75,-.25,5.125,-2.5,-.25,5.125],
// 3 4 -6.5 -.25 8 -2.5 -.25 5.125 -.5 -.25 5.125
  [3,4,-6.5,-.25,8,-2.5,-.25,5.125,-.5,-.25,5.125],
// 4 4 -6.5 -.25 8 -.5 -.25 5.125 .25 -.25 5.125 6.5 -.25 8
  [4,4,-6.5,-.25,8,-.5,-.25,5.125,.25,-.25,5.125,6.5,-.25,8],
// 3 4 6.5 -.25 8 .25 -.25 5.125 2 -.25 5.125
  [3,4,6.5,-.25,8,.25,-.25,5.125,2,-.25,5.125],
// 3 4 6.5 -.25 8 2 -.25 5.125 4 -.25 5.125
  [3,4,6.5,-.25,8,2,-.25,5.125,4,-.25,5.125],
// 4 4 6.5 -.25 8 4 -.25 5.125 5.75 -.25 5.125 8 -.25 6.5
  [4,4,6.5,-.25,8,4,-.25,5.125,5.75,-.25,5.125,8,-.25,6.5],
// 4 4 -8 -.25 6.5 -8 -.25 -6.5 -5.75 -.25 -5.125 -5.75 -.25 5.125
  [4,4,-8,-.25,6.5,-8,-.25,-6.5,-5.75,-.25,-5.125,-5.75,-.25,5.125],
// 4 4 -3.75 -.25 5.125 -3.75 -.25 1 -2.5 -.25 1 -2.5 -.25 5.125
  [4,4,-3.75,-.25,5.125,-3.75,-.25,1,-2.5,-.25,1,-2.5,-.25,5.125],
// 3 4 -.5 -.25 5.125 -.5 -.25 -5.125 .25 -.25 5.125
  [3,4,-.5,-.25,5.125,-.5,-.25,-5.125,.25,-.25,5.125],
// 4 4 .25 -.25 5.125 -.5 -.25 -5.125 2 -.25 -5.125 2 -.25 -1.2625
  [4,4,.25,-.25,5.125,-.5,-.25,-5.125,2,-.25,-5.125,2,-.25,-1.2625],
// 3 4 2 -.25 5.125 3 -.25 1.475 4 -.25 5.125
  [3,4,2,-.25,5.125,3,-.25,1.475,4,-.25,5.125],
// 3 4 8 -.25 6.5 5.75 -.25 5.125 4 -.25 -1.2625
  [3,4,8,-.25,6.5,5.75,-.25,5.125,4,-.25,-1.2625],
// 4 4 8 -.25 6.5 4 -.25 -1.2625 4 -.25 -5.125 8 -.25 -6.5
  [4,4,8,-.25,6.5,4,-.25,-1.2625,4,-.25,-5.125,8,-.25,-6.5],
// 4 4 -3.75 -.25 -1 -3.75 -.25 -5.125 -2.5 -.25 -5.125 -2.5 -.25 -1
  [4,4,-3.75,-.25,-1,-3.75,-.25,-5.125,-2.5,-.25,-5.125,-2.5,-.25,-1],
// 4 4 -5.75 -.25 -5.125 -8 -.25 -6.5 -6.5 -.25 -8 -3.75 -.25 -5.125
  [4,4,-5.75,-.25,-5.125,-8,-.25,-6.5,-6.5,-.25,-8,-3.75,-.25,-5.125],
// 3 4 -6.5 -.25 -8 -2.5 -.25 -5.125 -3.75 -.25 -5.125
  [3,4,-6.5,-.25,-8,-2.5,-.25,-5.125,-3.75,-.25,-5.125],
// 3 4 -6.5 -.25 -8 -.5 -.25 -5.125 -2.5 -.25 -5.125
  [3,4,-6.5,-.25,-8,-.5,-.25,-5.125,-2.5,-.25,-5.125],
// 4 4 -6.5 -.25 -8 6.5 -.25 -8 2 -.25 -5.125 -.5 -.25 -5.125
  [4,4,-6.5,-.25,-8,6.5,-.25,-8,2,-.25,-5.125,-.5,-.25,-5.125],
// 4 4 6.5 -.25 -8 8 -.25 -6.5 4 -.25 -5.125 2 -.25 -5.125
  [4,4,6.5,-.25,-8,8,-.25,-6.5,4,-.25,-5.125,2,-.25,-5.125],
];
module ldraw_lib__6142275t(step=0, col=false, unit=2/5, alt=false, line=0.2, solid=!$preview)
    makepoly(ldraw_lib__6142275t(solid), step=step, col=col, unit=unit, alt=alt, line=line, solid=solid);
ldraw_lib__6142275t(line=0.2);
